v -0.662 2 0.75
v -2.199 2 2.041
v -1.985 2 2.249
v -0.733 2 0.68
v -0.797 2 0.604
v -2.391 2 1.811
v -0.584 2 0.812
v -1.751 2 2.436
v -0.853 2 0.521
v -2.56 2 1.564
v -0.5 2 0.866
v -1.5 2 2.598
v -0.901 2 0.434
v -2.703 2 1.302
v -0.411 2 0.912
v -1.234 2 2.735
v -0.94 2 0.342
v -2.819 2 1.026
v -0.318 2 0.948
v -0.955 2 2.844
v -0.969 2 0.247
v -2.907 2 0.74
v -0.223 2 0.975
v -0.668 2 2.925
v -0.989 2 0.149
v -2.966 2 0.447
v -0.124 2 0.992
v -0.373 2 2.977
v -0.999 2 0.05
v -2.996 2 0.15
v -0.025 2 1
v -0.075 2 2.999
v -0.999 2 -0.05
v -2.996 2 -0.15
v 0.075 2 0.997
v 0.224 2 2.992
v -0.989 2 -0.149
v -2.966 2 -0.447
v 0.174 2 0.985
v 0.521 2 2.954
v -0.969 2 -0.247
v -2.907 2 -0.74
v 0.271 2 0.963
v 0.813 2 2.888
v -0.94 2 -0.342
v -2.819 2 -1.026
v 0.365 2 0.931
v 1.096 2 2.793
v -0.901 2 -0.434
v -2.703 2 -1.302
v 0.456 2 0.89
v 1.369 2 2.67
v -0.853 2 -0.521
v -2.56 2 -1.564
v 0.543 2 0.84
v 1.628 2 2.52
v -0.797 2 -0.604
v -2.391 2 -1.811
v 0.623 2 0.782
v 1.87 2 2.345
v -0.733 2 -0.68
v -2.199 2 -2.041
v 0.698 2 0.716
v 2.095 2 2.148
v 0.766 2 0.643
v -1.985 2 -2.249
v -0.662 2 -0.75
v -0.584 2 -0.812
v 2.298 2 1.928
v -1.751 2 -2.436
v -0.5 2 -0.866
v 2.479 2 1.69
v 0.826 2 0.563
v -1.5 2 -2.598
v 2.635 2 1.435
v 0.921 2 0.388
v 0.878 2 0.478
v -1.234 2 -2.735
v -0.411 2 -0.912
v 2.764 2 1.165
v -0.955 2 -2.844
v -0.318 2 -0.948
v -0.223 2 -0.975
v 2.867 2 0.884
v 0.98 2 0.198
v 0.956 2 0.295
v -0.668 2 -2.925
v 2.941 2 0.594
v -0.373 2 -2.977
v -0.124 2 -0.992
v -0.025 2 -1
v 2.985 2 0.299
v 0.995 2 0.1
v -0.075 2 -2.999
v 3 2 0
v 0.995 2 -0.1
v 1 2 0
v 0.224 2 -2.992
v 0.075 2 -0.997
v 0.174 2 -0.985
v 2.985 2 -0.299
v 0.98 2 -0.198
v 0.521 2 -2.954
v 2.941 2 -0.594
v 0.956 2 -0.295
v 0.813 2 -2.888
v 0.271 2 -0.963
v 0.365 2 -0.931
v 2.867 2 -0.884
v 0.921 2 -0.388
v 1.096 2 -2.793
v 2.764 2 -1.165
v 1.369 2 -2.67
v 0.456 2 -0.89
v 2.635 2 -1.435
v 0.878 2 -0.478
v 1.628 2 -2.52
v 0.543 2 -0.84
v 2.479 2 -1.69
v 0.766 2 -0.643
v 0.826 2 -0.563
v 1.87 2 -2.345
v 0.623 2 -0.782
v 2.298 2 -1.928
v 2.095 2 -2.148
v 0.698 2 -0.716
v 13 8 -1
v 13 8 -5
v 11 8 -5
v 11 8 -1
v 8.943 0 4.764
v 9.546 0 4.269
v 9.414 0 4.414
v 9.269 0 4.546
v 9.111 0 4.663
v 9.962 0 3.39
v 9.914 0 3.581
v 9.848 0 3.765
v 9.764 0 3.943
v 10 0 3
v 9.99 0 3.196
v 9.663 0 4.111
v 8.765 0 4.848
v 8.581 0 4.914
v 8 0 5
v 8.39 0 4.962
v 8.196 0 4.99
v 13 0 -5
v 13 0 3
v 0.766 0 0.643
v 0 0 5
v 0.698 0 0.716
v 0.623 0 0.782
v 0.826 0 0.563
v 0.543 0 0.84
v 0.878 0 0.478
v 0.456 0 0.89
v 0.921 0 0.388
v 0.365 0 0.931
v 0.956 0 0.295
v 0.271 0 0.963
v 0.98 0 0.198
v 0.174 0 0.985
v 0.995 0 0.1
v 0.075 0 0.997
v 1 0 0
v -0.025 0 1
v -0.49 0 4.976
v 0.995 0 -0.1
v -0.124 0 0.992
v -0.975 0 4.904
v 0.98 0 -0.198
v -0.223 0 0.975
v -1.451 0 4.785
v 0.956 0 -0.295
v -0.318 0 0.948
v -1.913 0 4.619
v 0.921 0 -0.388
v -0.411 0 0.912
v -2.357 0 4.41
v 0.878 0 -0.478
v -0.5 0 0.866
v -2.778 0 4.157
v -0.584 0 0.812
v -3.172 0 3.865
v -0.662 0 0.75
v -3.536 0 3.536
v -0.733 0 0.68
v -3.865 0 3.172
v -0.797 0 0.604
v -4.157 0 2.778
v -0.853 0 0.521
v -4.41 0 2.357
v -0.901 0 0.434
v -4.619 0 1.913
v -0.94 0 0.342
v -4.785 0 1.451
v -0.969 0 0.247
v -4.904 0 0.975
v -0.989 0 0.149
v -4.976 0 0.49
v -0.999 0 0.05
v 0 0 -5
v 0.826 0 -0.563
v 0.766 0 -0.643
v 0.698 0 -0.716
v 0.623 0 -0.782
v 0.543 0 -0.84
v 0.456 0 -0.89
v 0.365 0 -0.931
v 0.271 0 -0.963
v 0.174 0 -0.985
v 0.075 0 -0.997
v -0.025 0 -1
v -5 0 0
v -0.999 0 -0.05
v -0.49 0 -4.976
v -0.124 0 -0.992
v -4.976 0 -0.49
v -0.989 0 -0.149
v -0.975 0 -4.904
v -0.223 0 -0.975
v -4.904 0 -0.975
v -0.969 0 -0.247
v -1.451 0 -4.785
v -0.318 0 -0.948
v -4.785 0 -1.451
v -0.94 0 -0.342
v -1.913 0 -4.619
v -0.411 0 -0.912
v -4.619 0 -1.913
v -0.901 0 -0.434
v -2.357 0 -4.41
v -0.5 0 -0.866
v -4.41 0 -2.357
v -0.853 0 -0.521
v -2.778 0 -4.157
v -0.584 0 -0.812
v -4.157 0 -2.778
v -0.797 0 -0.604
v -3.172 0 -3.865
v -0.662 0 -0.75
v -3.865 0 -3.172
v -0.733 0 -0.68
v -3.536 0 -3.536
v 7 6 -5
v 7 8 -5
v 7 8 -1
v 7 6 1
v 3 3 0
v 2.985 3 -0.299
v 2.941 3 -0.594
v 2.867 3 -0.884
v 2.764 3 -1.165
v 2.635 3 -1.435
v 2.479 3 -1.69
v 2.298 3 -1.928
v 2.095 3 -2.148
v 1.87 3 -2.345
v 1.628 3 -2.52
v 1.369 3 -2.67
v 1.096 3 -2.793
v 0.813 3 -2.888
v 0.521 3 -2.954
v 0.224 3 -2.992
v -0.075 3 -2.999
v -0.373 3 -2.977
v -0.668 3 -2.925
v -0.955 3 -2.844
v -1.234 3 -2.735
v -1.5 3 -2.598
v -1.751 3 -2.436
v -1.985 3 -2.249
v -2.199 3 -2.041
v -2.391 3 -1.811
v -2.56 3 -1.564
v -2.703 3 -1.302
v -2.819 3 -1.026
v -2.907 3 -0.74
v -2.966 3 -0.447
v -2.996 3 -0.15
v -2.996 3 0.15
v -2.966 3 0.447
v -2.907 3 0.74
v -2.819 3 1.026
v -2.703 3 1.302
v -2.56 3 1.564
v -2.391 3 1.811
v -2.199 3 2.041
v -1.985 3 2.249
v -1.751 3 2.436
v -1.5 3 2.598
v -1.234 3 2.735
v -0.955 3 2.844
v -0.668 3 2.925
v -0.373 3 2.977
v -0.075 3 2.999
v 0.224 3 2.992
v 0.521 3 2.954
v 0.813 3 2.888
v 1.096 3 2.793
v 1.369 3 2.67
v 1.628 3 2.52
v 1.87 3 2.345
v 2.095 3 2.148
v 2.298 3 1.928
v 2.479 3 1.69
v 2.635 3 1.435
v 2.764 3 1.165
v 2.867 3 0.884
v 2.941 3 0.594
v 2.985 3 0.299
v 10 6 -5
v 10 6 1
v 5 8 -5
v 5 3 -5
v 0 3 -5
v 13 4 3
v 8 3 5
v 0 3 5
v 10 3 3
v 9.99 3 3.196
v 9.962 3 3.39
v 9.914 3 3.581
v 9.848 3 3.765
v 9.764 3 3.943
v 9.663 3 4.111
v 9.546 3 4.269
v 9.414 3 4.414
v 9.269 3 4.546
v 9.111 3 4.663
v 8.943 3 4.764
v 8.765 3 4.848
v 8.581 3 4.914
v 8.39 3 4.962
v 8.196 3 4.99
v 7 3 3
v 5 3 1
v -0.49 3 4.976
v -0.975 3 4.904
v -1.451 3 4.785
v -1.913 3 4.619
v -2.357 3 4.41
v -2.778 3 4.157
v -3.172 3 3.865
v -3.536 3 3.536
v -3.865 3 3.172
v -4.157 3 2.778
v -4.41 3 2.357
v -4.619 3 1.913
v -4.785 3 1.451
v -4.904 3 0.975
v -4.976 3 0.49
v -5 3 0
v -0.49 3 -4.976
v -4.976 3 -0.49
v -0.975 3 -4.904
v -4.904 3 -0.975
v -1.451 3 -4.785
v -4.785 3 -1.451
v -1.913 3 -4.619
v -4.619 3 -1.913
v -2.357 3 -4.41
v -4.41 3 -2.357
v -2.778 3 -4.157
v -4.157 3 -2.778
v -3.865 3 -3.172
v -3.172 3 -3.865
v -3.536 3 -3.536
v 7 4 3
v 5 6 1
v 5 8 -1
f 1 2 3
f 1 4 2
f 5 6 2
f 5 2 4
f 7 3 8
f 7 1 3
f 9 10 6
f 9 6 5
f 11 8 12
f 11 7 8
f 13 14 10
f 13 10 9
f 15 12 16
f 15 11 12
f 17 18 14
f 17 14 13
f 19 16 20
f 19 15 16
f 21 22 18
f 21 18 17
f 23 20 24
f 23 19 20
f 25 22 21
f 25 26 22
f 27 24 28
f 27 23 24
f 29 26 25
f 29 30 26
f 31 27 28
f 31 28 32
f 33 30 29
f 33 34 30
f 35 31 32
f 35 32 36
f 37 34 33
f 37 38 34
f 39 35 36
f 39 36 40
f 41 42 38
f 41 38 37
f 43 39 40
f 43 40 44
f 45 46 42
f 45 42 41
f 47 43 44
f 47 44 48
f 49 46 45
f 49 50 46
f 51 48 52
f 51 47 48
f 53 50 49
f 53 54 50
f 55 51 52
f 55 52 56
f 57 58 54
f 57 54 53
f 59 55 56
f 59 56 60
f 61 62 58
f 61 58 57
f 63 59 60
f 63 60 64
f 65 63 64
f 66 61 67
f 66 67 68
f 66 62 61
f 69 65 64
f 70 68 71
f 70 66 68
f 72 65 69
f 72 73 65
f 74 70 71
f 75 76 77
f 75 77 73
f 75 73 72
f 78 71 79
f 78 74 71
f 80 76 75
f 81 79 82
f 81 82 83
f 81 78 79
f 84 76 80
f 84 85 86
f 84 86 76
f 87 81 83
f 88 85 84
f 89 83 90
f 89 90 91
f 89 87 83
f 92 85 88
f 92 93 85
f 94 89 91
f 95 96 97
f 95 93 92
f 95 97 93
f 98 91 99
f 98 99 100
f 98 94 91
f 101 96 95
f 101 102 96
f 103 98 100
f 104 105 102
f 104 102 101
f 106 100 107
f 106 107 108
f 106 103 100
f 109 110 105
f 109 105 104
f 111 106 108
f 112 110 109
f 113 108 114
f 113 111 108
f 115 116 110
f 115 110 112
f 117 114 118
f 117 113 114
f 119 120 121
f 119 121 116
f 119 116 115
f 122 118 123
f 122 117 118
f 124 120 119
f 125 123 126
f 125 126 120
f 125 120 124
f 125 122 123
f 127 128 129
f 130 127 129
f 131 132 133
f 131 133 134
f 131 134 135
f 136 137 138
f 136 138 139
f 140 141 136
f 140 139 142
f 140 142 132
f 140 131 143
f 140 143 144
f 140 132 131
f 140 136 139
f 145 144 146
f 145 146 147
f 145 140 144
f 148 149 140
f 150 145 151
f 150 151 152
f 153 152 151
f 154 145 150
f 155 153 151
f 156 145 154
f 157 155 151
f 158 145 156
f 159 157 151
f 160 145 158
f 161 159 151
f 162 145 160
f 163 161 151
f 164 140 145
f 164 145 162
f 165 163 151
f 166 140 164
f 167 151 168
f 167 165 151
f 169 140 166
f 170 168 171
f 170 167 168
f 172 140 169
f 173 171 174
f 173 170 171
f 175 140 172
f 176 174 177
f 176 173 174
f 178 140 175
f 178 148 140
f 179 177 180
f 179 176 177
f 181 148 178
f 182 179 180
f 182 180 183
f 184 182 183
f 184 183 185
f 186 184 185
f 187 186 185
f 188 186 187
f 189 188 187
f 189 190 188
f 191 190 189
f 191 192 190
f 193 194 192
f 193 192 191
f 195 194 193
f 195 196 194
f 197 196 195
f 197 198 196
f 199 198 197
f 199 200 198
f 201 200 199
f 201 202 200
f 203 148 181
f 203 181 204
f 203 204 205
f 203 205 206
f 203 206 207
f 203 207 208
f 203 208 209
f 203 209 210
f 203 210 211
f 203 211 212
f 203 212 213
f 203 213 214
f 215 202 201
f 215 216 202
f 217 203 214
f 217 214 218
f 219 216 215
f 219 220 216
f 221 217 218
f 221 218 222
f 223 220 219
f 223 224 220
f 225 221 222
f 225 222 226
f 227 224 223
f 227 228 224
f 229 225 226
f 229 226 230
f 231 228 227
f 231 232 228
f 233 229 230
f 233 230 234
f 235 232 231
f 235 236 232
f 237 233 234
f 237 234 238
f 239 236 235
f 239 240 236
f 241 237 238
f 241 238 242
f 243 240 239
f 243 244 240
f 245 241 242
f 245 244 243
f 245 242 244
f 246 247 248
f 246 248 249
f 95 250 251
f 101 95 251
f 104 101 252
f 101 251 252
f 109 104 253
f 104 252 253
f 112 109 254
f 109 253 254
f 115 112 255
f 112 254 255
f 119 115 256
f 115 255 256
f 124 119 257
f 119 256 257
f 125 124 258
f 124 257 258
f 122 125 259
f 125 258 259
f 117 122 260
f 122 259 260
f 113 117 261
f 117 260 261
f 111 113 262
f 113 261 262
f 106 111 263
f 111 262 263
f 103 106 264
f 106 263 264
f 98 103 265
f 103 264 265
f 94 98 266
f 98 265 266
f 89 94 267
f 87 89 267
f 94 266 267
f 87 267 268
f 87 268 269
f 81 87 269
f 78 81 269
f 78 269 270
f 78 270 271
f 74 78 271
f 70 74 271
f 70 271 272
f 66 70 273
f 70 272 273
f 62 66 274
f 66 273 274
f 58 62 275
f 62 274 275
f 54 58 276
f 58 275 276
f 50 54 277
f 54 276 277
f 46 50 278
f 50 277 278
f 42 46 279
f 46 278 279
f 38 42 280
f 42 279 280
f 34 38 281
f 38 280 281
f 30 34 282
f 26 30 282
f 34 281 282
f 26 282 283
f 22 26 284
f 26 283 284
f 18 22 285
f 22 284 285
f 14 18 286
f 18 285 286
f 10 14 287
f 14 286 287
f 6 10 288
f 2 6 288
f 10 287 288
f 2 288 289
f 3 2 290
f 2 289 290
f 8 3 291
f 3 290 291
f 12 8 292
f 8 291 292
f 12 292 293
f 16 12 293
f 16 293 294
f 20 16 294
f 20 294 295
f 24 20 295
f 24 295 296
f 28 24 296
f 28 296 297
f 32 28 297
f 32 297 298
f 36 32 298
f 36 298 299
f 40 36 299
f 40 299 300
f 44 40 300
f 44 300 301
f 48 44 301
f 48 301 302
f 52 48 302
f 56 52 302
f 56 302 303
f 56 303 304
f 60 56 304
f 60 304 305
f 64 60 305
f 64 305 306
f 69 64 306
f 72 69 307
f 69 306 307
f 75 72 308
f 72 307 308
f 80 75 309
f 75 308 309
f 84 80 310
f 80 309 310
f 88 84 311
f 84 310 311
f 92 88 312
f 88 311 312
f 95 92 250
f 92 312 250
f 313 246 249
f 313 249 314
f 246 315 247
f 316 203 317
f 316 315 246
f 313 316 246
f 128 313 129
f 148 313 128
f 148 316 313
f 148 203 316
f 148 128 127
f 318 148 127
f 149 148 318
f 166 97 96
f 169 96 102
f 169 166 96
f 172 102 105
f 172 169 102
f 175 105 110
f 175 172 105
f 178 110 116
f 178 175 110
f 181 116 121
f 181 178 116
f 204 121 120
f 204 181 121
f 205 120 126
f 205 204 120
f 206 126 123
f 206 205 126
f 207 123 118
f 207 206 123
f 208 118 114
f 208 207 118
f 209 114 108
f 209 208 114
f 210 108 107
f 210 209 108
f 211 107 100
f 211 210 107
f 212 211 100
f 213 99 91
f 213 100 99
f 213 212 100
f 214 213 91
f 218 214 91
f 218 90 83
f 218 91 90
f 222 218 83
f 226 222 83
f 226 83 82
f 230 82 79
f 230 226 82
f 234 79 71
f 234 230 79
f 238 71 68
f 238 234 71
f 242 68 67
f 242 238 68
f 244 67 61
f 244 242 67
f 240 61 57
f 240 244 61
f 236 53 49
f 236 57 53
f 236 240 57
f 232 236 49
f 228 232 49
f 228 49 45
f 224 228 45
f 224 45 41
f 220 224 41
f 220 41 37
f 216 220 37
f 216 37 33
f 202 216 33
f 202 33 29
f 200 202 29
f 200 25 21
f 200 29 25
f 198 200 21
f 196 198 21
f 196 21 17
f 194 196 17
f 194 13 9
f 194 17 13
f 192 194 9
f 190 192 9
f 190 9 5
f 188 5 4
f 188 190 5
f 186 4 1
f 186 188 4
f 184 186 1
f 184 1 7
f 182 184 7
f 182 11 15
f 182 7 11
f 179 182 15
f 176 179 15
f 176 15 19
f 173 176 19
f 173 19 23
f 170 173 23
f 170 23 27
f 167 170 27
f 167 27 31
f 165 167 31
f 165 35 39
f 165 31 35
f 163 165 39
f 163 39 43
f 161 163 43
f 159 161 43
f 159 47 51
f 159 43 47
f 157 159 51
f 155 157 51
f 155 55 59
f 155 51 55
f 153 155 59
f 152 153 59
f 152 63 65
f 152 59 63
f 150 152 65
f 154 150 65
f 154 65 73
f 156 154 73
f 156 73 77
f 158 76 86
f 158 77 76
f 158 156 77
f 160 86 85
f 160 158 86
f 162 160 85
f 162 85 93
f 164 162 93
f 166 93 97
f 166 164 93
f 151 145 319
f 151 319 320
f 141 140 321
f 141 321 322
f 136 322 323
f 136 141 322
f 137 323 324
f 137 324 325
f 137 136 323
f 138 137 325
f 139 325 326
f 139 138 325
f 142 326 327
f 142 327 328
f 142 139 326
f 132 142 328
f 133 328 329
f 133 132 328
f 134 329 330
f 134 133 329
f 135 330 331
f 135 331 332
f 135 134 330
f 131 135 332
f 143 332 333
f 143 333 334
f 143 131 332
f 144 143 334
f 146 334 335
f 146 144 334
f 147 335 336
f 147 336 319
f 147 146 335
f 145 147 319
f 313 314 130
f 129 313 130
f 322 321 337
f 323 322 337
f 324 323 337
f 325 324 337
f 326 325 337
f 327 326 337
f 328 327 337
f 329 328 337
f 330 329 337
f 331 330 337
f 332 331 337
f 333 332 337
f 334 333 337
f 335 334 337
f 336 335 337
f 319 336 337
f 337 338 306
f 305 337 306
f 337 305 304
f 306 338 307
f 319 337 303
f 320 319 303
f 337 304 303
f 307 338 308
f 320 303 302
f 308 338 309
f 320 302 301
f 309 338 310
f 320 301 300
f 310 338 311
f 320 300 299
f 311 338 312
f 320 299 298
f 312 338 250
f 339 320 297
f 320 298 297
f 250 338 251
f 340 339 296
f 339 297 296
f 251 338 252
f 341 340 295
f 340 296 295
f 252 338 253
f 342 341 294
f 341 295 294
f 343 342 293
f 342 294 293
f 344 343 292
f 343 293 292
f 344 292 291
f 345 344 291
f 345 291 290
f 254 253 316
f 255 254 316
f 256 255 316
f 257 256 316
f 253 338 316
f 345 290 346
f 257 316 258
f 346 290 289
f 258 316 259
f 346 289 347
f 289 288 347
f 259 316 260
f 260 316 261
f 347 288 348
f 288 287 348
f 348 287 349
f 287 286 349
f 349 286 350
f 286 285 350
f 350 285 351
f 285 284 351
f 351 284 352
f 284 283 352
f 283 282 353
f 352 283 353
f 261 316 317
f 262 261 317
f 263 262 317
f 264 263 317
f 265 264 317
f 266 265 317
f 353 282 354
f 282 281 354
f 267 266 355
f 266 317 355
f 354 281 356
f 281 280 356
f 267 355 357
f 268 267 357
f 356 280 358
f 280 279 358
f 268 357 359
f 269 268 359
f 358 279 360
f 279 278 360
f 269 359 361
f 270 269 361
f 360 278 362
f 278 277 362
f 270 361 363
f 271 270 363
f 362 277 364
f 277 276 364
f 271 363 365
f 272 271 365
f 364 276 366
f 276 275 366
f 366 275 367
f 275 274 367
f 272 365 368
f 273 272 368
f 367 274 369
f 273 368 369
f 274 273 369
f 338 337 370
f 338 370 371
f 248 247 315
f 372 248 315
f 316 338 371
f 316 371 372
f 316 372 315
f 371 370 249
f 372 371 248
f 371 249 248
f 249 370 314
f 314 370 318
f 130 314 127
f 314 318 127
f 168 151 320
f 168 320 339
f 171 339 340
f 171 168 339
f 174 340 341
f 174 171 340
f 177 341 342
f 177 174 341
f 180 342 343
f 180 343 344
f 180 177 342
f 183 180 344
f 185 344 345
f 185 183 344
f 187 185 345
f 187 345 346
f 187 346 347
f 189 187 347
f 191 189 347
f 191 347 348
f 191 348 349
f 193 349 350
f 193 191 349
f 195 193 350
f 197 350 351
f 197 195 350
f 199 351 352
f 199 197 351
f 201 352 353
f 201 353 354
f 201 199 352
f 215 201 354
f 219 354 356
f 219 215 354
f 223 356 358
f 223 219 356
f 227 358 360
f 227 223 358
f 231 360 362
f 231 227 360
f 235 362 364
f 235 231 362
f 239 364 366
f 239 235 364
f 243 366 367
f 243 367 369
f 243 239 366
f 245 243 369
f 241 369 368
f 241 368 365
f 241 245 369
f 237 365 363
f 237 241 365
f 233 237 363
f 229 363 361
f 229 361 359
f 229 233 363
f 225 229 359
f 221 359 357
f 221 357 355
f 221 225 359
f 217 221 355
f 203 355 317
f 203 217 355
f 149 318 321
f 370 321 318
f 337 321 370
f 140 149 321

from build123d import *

# Parameters (mm, degrees)
SKETCH1_R           = 1
BOSS_EXTRUDE1_DEPTH = 3
SKETCH2_R           = 3
CUT_EXTRUDE1_DEPTH  = 1
BOSS_EXTRUDE2_DEPTH = 5
CUT_EXTRUDE2_DEPTH  = 13
CUT_EXTRUDE3_DEPTH  = 13


with BuildPart() as part:
    # Sketch1 → Boss-Extrude1 (new body)
    with BuildSketch(Plane(origin=(0, 0, 0), x_dir=(1, 0, 0), z_dir=(0, 1, 0))):
        with BuildLine():
            Line((0, 5), (13, 5))
            Line((13, 5), (13, -3))
            Line((13, -3), (10, -3))
            ThreePointArc((10, -3), (9.414213562, -4.414213562), (8, -5))
            Line((8, -5), (0, -5))
            ThreePointArc((0, -5), (-5, 0), (0, 5))
        make_face()
        Circle(SKETCH1_R, mode=Mode.SUBTRACT)
    extrude(amount=BOSS_EXTRUDE1_DEPTH)

    # Sketch2 → Cut-Extrude1 (cut)
    with BuildSketch(Plane(origin=(0, 3, 0), x_dir=(1, 0, 0), z_dir=(0, 1, 0))):
        Circle(SKETCH2_R)
    extrude(amount=-CUT_EXTRUDE1_DEPTH, mode=Mode.SUBTRACT)

    # Sketch3 → Boss-Extrude2 (add)
    with BuildSketch(Plane(origin=(0, 3, 0), x_dir=(1, 0, 0), z_dir=(0, 1, 0))):
        Polygon((13, -3), (7, -3), (5, -1), (5, 5), (13, 5), align=None)
    extrude(amount=BOSS_EXTRUDE2_DEPTH)

    # Sketch4 → Cut-Extrude2 (cut)
    with BuildSketch(Plane(origin=(13, 0, 0), x_dir=(0, 0, -1), z_dir=(1, 0, 0))):
        Polygon((-3, 4), (1, 8), (-3, 8), align=None)
    extrude(amount=-CUT_EXTRUDE2_DEPTH, mode=Mode.SUBTRACT)

    # Sketch5 → Cut-Extrude3 (cut)
    with BuildSketch(Plane(origin=(0, 0, -5), x_dir=(-1, 0, 0), z_dir=(0, 0, -1))):
        Polygon((-7, 8), (-7, 6), (-10, 6), (-11, 8), align=None)
    extrude(amount=-CUT_EXTRUDE3_DEPTH, mode=Mode.SUBTRACT)


solid = part.part
